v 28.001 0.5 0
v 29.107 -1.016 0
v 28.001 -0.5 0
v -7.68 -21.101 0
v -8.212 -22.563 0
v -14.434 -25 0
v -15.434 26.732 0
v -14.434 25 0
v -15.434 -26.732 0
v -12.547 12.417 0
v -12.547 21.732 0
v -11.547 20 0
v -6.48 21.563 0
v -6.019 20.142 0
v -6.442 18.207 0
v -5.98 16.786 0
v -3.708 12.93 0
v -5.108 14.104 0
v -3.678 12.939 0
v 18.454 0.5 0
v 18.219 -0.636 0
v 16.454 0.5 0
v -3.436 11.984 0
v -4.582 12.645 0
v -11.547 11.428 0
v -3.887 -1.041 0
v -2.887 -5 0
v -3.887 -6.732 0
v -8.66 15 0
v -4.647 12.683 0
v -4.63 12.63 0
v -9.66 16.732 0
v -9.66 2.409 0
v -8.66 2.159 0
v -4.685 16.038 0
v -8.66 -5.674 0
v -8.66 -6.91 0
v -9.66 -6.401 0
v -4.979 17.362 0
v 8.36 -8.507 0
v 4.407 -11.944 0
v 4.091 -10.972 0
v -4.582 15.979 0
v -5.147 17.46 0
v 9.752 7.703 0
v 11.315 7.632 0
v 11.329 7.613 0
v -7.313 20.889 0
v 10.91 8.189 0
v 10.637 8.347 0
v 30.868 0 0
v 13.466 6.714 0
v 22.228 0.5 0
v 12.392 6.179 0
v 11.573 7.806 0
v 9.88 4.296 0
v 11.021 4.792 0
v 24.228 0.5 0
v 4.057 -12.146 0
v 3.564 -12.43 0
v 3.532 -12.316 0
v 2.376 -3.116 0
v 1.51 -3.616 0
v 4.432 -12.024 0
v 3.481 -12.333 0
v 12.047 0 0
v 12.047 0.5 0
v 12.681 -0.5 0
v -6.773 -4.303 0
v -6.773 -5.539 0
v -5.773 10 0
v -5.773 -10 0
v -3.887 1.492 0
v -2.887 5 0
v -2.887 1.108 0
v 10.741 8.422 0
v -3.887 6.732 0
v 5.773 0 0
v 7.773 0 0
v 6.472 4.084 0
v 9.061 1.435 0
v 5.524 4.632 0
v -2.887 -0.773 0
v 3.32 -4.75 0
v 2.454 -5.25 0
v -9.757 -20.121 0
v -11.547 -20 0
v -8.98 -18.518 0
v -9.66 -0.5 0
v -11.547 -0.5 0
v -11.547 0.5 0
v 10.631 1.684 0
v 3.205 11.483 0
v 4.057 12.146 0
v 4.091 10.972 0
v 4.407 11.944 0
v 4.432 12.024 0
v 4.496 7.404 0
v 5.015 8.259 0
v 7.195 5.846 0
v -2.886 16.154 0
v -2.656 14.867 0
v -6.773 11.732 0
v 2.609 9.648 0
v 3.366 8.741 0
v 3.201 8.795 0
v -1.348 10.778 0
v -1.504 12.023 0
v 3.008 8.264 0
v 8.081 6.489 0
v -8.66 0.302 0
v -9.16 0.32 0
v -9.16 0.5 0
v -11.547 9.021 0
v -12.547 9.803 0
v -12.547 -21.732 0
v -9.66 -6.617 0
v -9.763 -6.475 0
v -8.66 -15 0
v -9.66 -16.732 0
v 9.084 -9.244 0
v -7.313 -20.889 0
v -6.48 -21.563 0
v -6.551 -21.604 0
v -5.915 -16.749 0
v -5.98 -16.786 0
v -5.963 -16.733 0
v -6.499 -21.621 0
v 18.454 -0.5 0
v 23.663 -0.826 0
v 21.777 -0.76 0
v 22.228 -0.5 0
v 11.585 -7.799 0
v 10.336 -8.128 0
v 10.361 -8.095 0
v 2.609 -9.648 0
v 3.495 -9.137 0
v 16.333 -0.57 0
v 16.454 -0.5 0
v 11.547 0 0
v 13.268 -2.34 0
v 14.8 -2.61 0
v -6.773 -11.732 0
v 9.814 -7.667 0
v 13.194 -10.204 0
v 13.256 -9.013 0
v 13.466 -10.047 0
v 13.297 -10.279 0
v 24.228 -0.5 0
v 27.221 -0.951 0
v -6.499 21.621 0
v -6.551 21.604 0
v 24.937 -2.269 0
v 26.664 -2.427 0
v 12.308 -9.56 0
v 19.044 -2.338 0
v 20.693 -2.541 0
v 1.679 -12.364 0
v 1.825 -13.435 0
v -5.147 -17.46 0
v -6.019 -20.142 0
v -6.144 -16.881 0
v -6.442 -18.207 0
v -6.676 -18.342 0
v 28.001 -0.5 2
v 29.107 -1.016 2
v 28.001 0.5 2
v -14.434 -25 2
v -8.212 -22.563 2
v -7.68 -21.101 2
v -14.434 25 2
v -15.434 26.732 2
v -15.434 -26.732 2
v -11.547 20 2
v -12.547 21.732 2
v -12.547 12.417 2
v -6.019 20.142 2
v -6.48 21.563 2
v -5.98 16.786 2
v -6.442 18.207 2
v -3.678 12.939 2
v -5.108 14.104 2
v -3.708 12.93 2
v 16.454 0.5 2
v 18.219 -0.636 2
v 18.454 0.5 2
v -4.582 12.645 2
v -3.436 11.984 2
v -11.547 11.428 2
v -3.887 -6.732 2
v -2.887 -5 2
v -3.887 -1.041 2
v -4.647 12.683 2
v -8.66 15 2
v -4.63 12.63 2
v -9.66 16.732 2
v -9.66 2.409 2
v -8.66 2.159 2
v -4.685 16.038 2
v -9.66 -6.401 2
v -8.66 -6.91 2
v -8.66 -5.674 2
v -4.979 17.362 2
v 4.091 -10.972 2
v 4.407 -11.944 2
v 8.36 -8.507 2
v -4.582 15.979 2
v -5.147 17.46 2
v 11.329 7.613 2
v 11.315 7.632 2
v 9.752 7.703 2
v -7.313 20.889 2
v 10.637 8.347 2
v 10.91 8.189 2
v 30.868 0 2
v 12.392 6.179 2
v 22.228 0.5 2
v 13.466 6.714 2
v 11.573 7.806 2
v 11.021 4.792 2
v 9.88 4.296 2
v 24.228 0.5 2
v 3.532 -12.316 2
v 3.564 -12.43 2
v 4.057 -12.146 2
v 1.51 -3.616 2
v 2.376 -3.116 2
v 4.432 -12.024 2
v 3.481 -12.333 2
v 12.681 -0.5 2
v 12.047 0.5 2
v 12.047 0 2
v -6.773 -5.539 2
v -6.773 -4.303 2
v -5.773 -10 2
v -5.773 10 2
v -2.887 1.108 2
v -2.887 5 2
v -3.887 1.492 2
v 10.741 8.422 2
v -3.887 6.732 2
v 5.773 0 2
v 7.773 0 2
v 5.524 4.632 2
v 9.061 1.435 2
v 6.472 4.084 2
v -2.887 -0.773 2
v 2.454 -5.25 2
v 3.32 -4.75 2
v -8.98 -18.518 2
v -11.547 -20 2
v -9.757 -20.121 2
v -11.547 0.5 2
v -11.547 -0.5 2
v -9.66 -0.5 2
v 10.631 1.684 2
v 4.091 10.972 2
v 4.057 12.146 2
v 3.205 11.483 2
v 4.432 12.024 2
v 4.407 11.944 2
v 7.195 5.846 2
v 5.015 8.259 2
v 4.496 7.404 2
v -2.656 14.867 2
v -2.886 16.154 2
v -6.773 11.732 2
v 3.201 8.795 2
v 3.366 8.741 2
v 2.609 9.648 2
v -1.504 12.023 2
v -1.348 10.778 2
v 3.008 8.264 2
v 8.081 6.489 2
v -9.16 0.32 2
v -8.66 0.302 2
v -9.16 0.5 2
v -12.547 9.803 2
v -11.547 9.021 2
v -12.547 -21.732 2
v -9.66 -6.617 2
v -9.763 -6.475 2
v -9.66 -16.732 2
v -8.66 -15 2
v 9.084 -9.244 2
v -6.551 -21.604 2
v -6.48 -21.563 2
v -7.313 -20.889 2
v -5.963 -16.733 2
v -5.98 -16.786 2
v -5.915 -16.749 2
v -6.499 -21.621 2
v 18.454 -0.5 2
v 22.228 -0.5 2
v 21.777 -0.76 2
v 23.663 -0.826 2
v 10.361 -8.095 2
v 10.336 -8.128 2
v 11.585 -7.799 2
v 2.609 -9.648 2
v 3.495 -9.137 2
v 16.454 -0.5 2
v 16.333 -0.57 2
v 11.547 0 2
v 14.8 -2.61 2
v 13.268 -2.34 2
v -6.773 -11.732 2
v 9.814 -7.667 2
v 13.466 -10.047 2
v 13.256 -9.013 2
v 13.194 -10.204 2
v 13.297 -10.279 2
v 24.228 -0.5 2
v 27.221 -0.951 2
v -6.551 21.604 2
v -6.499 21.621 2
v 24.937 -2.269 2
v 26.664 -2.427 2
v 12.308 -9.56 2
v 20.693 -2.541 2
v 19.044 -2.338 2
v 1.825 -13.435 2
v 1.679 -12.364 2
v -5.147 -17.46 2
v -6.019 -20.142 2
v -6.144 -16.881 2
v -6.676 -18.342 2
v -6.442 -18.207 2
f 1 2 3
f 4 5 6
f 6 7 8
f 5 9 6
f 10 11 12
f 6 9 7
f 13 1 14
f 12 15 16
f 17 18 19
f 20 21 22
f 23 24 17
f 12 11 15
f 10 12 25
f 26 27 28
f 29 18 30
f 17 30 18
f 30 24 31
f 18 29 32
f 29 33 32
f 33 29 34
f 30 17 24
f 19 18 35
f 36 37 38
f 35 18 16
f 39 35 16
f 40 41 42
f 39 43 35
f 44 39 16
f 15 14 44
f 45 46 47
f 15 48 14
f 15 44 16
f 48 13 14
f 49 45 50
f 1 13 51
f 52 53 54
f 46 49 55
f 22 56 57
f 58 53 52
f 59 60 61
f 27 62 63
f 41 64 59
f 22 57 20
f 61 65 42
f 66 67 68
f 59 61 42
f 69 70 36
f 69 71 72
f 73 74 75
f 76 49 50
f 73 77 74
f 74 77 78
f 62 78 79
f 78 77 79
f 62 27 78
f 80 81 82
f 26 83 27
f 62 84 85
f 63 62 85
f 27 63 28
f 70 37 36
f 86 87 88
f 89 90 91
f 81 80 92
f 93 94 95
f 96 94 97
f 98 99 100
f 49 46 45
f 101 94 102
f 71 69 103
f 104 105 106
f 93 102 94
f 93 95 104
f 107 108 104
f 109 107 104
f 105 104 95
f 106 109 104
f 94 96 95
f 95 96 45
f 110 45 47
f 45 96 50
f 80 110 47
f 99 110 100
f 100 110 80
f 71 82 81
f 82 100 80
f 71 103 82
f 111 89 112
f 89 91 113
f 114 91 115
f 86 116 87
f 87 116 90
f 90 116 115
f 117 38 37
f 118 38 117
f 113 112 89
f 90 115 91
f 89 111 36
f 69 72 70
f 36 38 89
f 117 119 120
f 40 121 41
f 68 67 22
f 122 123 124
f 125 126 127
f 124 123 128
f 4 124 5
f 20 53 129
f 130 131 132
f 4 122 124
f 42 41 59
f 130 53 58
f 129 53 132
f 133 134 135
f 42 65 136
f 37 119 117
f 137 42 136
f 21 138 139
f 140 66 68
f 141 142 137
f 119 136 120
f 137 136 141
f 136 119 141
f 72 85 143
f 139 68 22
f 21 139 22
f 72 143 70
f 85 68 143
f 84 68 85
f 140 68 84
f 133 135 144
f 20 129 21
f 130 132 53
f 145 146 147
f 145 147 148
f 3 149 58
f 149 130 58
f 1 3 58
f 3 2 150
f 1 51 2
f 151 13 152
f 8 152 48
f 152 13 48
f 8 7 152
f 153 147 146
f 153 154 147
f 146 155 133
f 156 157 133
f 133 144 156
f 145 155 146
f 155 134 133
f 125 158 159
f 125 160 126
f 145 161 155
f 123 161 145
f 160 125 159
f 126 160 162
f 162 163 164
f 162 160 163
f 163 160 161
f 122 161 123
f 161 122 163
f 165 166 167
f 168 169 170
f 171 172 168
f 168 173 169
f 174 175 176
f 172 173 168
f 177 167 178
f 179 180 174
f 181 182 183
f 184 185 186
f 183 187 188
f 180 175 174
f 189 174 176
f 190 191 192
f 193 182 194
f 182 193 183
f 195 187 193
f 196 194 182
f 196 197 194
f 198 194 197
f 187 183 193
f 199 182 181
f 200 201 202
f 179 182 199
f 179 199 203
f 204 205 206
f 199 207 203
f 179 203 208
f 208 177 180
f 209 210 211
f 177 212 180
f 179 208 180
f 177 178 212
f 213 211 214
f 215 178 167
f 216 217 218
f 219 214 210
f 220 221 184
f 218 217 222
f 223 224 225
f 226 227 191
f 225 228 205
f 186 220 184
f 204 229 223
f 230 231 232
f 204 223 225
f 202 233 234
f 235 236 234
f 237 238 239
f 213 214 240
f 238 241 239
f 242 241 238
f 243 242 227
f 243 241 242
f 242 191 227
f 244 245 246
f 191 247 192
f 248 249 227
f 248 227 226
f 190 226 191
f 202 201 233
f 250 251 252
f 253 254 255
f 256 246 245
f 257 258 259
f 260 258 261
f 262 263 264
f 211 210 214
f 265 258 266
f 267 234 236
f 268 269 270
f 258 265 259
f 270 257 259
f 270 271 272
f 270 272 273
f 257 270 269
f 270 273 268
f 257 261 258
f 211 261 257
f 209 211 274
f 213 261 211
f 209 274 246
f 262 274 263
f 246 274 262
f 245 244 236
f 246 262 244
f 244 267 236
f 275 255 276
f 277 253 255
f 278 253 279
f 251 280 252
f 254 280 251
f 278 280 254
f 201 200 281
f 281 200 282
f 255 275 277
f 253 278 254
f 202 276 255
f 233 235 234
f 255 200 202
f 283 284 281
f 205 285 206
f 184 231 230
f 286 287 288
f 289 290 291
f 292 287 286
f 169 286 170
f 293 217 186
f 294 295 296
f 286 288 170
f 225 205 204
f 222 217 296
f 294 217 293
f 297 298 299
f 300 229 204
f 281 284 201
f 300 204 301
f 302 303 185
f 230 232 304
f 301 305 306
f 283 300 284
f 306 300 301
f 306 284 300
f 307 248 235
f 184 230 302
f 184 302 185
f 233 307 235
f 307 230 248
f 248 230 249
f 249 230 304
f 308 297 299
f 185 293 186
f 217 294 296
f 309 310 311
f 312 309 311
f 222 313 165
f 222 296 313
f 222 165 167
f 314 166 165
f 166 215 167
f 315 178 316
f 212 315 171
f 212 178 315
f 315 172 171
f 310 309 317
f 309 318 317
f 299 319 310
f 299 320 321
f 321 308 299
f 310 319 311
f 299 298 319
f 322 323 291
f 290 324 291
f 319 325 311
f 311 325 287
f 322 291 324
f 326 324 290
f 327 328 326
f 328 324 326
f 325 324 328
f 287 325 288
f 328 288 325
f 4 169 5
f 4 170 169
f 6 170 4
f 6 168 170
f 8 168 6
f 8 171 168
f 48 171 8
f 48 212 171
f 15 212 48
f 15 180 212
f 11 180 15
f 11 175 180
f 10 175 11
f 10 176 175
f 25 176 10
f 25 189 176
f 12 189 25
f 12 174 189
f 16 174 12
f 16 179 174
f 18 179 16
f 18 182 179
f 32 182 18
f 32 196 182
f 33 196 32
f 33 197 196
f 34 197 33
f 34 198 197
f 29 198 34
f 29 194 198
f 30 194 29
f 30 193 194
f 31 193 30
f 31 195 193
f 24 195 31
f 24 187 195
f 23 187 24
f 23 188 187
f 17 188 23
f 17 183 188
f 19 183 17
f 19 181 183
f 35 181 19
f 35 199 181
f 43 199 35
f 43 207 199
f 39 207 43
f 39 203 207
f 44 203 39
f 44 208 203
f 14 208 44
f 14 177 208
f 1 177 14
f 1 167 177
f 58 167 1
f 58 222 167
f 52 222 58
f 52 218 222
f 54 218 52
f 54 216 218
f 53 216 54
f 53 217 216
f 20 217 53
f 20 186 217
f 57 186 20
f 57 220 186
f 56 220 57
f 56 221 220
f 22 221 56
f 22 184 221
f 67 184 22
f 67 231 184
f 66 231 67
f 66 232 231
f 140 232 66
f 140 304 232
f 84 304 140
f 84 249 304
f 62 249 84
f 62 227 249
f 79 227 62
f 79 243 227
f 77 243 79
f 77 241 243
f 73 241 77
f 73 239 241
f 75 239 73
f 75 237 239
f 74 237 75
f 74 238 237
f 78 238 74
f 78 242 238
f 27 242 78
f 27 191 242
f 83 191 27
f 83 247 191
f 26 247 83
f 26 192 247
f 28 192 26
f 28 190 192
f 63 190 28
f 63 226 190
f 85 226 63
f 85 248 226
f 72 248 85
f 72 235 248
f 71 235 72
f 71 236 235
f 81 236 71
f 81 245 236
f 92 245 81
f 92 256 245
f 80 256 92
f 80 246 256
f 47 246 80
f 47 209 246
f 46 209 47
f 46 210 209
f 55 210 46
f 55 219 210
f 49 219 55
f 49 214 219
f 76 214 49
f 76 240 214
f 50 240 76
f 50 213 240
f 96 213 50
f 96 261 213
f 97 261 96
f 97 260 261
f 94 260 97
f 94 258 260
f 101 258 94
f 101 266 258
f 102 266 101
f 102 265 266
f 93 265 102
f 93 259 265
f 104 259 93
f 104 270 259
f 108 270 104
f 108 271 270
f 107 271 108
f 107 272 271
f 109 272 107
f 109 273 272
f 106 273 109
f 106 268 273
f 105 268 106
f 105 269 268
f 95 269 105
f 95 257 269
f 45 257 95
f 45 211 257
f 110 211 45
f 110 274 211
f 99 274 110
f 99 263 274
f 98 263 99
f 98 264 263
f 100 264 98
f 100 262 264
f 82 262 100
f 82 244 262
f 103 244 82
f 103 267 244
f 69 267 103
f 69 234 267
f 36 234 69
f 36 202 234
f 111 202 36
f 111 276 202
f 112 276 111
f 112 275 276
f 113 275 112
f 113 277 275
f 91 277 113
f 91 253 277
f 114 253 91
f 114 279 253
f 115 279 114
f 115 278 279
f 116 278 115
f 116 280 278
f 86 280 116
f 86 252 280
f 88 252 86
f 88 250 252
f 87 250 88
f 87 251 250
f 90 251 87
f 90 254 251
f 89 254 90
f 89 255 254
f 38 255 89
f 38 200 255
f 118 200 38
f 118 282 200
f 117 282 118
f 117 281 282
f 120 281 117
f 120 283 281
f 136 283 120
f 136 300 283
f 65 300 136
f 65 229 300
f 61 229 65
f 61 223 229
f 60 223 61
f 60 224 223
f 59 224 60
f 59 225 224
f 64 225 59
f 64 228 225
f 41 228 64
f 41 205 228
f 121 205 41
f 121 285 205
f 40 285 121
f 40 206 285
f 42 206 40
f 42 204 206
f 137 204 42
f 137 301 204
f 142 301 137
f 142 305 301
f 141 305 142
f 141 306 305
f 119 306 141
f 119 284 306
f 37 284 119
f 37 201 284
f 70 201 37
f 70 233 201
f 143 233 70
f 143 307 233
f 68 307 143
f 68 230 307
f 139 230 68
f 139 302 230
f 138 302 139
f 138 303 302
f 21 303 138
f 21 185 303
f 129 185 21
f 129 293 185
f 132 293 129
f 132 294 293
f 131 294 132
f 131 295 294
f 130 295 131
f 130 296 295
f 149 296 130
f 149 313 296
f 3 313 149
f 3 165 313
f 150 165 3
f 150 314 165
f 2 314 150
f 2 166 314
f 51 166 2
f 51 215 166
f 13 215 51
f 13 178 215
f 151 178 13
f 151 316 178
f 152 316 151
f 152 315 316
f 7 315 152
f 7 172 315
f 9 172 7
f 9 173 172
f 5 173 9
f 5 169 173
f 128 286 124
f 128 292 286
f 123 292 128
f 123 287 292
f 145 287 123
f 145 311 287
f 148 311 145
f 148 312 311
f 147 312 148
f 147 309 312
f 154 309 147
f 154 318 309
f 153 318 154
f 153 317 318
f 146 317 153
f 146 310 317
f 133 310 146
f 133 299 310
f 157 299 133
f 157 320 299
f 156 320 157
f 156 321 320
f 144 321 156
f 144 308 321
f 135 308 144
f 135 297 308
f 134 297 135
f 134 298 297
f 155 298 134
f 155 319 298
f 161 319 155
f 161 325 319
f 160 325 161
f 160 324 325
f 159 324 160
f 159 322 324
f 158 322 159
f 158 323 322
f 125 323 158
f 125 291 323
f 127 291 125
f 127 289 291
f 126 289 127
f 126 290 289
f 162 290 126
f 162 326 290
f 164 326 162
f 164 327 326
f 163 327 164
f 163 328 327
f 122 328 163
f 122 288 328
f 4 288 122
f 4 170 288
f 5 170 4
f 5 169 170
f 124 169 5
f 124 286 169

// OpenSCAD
// file: random_maze_generator.scad
use <2d.scad>;

rows = 10; 
columns = 10; 
wall_thickness = 2;
wall_height = 5;
block_width = 5;


/*
 * constants, for clearness
 *
 */
 
// random directions, for picking up a direction to visit the next block
function PERMUTATION_OF_FOUR() = [
    [1, 2, 3, 4],
    [1, 2, 4, 3],
    [1, 3, 2, 4],
    [1, 3, 4, 2],
    [1, 4, 2, 3],
    [1, 4, 3, 2],
    [2, 1, 3, 4],
    [2, 1, 4, 3],
    [2, 3, 1, 4],
    [2, 3, 4, 1],
    [2, 4, 1, 3],
    [2, 4, 3, 1],
    [3, 1, 2, 4],
    [3, 1, 4, 2],
    [3, 2, 1, 4],
    [3, 2, 4, 1],
    [3, 4, 1, 2],
    [3, 4, 2, 1],
    [4, 1, 2, 3],
    [4, 1, 3, 2],
    [4, 2, 1, 3],
    [4, 2, 3, 1],
    [4, 3, 1, 2],
    [4, 3, 2, 1]
];

function NO_WALL() = 0;
function UP_WALL() = 1;
function RIGHT_WALL() = 2;
function UP_RIGHT_WALL() = 3;

function NOT_VISITED() = 0;
function VISITED() = 1;

/* 
 * modules for creating a maze
 *
 */

// create the outer wall of maze
module maze_outer_wall(rows, columns, block_width = 5, wall_thickness = 1) {
    x_line([0, rows * block_width], columns * block_width, wall_thickness);
    y_line([0, block_width], (rows - 1) * block_width, wall_thickness);
}

// create the inner wall of maze
module maze_inner_wall(maze, block_width = 5, wall_thickness = 1) {
    for(i = [0:len(maze) - 1]) {
        cord = maze[i];
        x = (cord[0] - 1) * block_width;
        y = (cord[1] - 1) * block_width;
        v = cord[3];
        
        if(v == 1 || v == 3) {
            x_line([x, y], block_width, wall_thickness);
        }
        if(v == 2 || v == 3) {
            y_line([x + block_width, y], block_width, wall_thickness);
        }
    }  
}

// create a maze
module maze(rows, columns, maze_vector, block_width = 5, wall_thickness = 1) {
     maze_outer_wall(rows, columns, block_width, wall_thickness);
     maze_inner_wall(maze_vector, block_width, wall_thickness);
}

/* 
 * utilities functions
 *
 */

// comare the equality of [x1, y1] and [x2, y2]
function cord_equals(cord1, cord2) = cord1 == cord2;

// is the point visited?
function not_visited(cord, vs, index = 0) =
    index == len(vs) ? true : 
        (cord_equals([vs[index][0], vs[index][1]], cord) && vs[index][2] == 1 ? false :
            not_visited(cord, vs, index + 1));
            
// pick a direction randomly
function rand_dirs() =
    PERMUTATION_OF_FOUR()[round(rands(0, 24, 1)[0])]; 

// give a index (exclusivly), slice a vector 
function head_to(i, vs) =
    i >= len(vs) ? vs : (
        i == 0 ? [] : concat(head_to(i - 1, vs), [vs[i - 1]])
    );

// give a index (exclusivly), slice a vector 
function tail_from(i, vs, index = 0, new_vs = []) =
    i >= len(vs) ? [] : (
        index < i ? tail_from(i, vs, index + 1) : (
            index < len(vs) ? tail_from(i, vs, index + 1, concat(new_vs, [vs[index]])) : new_vs
        )
    );

// replace v1 in the vector with v2 
function replace(v1, v2, vs, index = 0) =
    index == len(vs) ? vs : (
        vs[index] == v1 ? concat(concat(head_to(index, vs), [v2]), tail_from(index + 1, vs)) : replace(v1, v2, vs, index + 1)
    );
    
/* 
 * functions for generating a maze vector
 *
 */

// initialize rows of a maze
function init_row(n, length) =
    length == 0 ? [] : concat(init_row(n, length - 1), [[length, n, 0, UP_RIGHT_WALL()]]);
    
// initialize a maze
function init_maze(rows, columns) =
    rows == 0 ? [] : concat(init_maze(rows - 1, columns), init_row(rows, columns));
    
// find a vector in the maze vector
function find(i, j, maze_vector, index = 0) =
    index == len(maze_vector) ? [] : (
        cord_equals([i, j], [maze_vector[index][0], maze_vector[index][1]]) ? maze_vector[index] : find(i, j, maze_vector, index + 1)
    );

////
// NO_WALL = 0;
// UP_WALL = 1;
// RIGHT_WALL = 2;
// UP_RIGHT_WALL = 3;
function delete_right_wall(original_block) = 
    original_block == NO_WALL() || original_block == RIGHT_WALL() ? NO_WALL() : UP_WALL();

function delete_up_wall(original_block) = 
    (original_block == NO_WALL() || original_block == UP_WALL()) ? NO_WALL() : RIGHT_WALL();
    
function delete_right_wall_of(vs, is_visited, maze_vector) =
    replace(vs, [vs[0], vs[1] , is_visited, delete_right_wall(vs[3])] ,maze_vector);

function delete_up_wall_of(vs, is_visited, maze_vector) =
    replace(vs, [vs[0], vs[1] , is_visited, delete_up_wall(vs[3])] ,maze_vector);

function go_right(i, j, rows, columns, maze_vector) =
    go_maze(i + 1, j, rows, columns, delete_right_wall_of(find(i, j, maze_vector), VISITED(), maze_vector));
    
function go_up(i, j, rows, columns, maze_vector) =
    go_maze(i, j - 1, rows, columns, delete_up_wall_of(find(i, j, maze_vector), VISITED(), maze_vector));
    
function visit(v, maze_vector) =
    replace(v, [v[0], v[1], VISITED(), v[3]], maze_vector);
 
function go_left(i, j, rows, columns, maze_vector) =
    go_maze(i - 1, j, rows, columns, delete_right_wall_of(find(i - 1, j, maze_vector), NOT_VISITED(), maze_vector));
    
function go_down(i, j, rows, columns, maze_vector) =
    go_maze(i, j + 1, rows, columns, delete_up_wall_of(find(i, j + 1, maze_vector), NOT_VISITED(), maze_vector));
    
function go_maze(i, j, rows, columns, maze_vector) =
    look_around(i, j, rand_dirs(), rows, columns, visit(find(i, j, maze_vector), maze_vector));
    
function look_around(i, j, dirs, rows, columns, maze_vector, index = 0) =
    index == 4 ? maze_vector : 
        look_around( 
            i, j, dirs, 
            rows, columns, 
            build_wall(i, j, dirs[index], rows, columns, maze_vector), 
            index + 1
        ); 

function build_wall(i, j, n, rows, columns, maze_vector) = 
    n == 1 && i != columns && not_visited([i + 1, j], maze_vector) ? go_right(i, j, rows, columns, maze_vector) : ( 
        n == 2 && j != 1 && not_visited([i, j - 1], maze_vector) ? go_up(i, j, rows, columns, maze_vector)  : (
            n == 3 && i != 1 && not_visited([i - 1, j], maze_vector) ? go_left(i, j,rows, columns,  maze_vector)  : (
                n == 4 && j != rows && not_visited([i, j + 1], maze_vector) ? go_down(i, j, rows, columns, maze_vector) : maze_vector
            ) 
        )
    ); 
 
/*
 * create a maze
 *
 */
maze_vector = go_maze(1, 1, rows, columns, replace([columns, rows, 0, UP_RIGHT_WALL()], [columns, rows, 0, UP_WALL()], init_maze(rows, columns)));
linear_extrude(wall_height) 
    maze(rows, columns, maze_vector, block_width, wall_thickness);
// file: 2d.scad
function PI() = 3.14159;

// give a [x, y] point and length. draw a line in the x direction
module x_line(point, length, thickness = 1) {
    offset = thickness / 2;
    translate([point[0] - offset, point[1] - offset, 0]) 
        square([length + thickness, thickness]);
}

// give a [x, y] point and length. draw a line in the y direction
module y_line(point, length, thickness = 1) {
    offset = thickness / 2;
    translate([point[0] - offset, point[1] - offset, 0])  
        square([thickness, length + thickness]);
}

module a_quarter_arc(radius, angle, width = 1) {
    outer = radius + width;
    intersection() {
        difference() {
            offset(r = width) circle(radius, $fn=96); 
            circle(radius, $fn=96);
        }
        polygon([[0, 0], [outer, 0], [outer, outer * sin(angle)], [outer * cos(angle), outer * sin(angle)]]);
    }
}

module arc(radius, angles, width = 1) {
    angle_from = angles[0];
    angle_to = angles[1];
    angle_difference = angle_to - angle_from;
    outer = radius + width;
    rotate(angle_from)
        if(angle_difference <= 90) {
            a_quarter_arc(radius, angle_difference, width);
        } else if(angle_difference > 90 && angle_difference <= 180) {
            arc(radius, [0, 90], width);
            rotate(90) a_quarter_arc(radius, angle_difference - 90, width);
        } else if(angle_difference > 180 && angle_difference <= 270) {
            arc(radius, [0, 180], width);
            rotate(180) a_quarter_arc(radius, angle_difference - 180, width);
        } else if(angle_difference > 270 && angle_difference <= 360) {
            arc(radius, [0, 270], width);
            rotate(270) a_quarter_arc(radius, angle_difference - 270, width);
       }
}




// create a equilateral triangle
module equilateral_triangle(side_length, center = false) {
    radius = 0.57735026918962576450914878050196 * side_length;
	circle(r = radius, center = center, $fn = 3); 
}

// create a holly equilateral triangle
module holly_equilateral_triangle(side_length, thickness = 1, center = true) {
    difference() {
	    offset(delta = thickness) equilateral_triangle(side_length, center = center);
	    equilateral_triangle(side_length, center = center);
    }
}
// main file
use <2d.scad>;
use <random_maze_generator.scad>;

side_length = 50; 

wall_thickness = 1;
wall_height = 2;

cblocks = 10;  
levels = 5; 

// Given a side length of a equilateral triangle, return the length of incenter to vertex.
function triangle_incenter_to_vertex_length(triangle_side_length) = 0.57735026918962576450914878050196 * triangle_side_length;

// used by `sector_cutter` module. Accepted angle is from 0 to 90 degree.
module a_quarter_sector_cutter(radius, angle) {
    outer = radius;
    polygon([[0, 0], [outer, 0], [outer, outer * sin(angle)], [outer * cos(angle), outer * sin(angle)]]);
}

// userd by `holly_equilateral_triangle_sector` for difference
module sector_cutter(radius, angles) {
    angle_from = angles[0];
    angle_to = angles[1];
    angle_difference = angle_to - angle_from;
    
    rotate(angle_from)
        if(angle_difference <= 90) {
            a_quarter_sector_cutter(radius, angle_difference);
        } else if(angle_difference > 90 && angle_difference <= 180) {
            sector_cutter(radius, [0, 90]);
            rotate(90) a_quarter_sector_cutter(radius, angle_difference - 90);
        } else if(angle_difference > 180 && angle_difference <= 270) {
            sector_cutter(radius, [0, 180]);
            rotate(180) a_quarter_sector_cutter(radius, angle_difference - 180);
        } else if(angle_difference > 270 && angle_difference <= 360) {
            sector_cutter(radius, [0, 270]);
            rotate(270) a_quarter_sector_cutter(radius, angle_difference - 270);
       }
}

// For a triangle, a different angle has a different length from incenter to its side.
function triangle_incenter_to_side_length(incenter_to_vertex_length, angle) = 
    (angle >= 0 && angle <= 60) ? 0.5 * incenter_to_vertex_length / cos(angle) : (
	    (angle > 60 && angle <= 120) ? triangle_incenter_to_side_length(incenter_to_vertex_length, 120 - angle) : triangle_incenter_to_side_length(incenter_to_vertex_length, angle - 120)
	);

// draw a line from incenter to side for a equilateral triangle
module triangle_incenter_to_side_line(side_length, angle, incenter_to_side_blocks, level, thickness = 1) {
    block_length = triangle_incenter_to_side_length(triangle_incenter_to_vertex_length(side_length), angle + 60) / incenter_to_side_blocks ;
	
	rotate([0, 0, angle]) 
	    translate([block_length * (level - 1) + thickness, 0, 0])
		    x_line([0, 0], block_length - thickness / 2, thickness);
}

// draw a side between `angles[0]` and `angles[1]`
module holly_equilateral_triangle_sector(side_length, angles, thickness = 1) {
	intersection() {
        holly_equilateral_triangle(side_length, thickness);
	    sector_cutter(triangle_incenter_to_vertex_length(side_length) + thickness * 2, [angles[0], angles[1]]);
	}
}

module triangle_maze(side_length, cblocks, levels, thickness = 1) {
    full_circle_angle = 360;
    arc_angle = full_circle_angle / cblocks;
	incenter_to_side_blocks = levels - 2;
	
	divided_side_length = side_length / levels;
	
	maze = go_maze(1, 1, cblocks, incenter_to_side_blocks, replace([incenter_to_side_blocks, cblocks, 0, UP_RIGHT_WALL()], [incenter_to_side_blocks, cblocks, 0, UP_WALL()], init_maze(cblocks, incenter_to_side_blocks)));
	  
	// maze
    for(i = [0:len(maze) - 1]) { 
        cord = maze[i];
		cr = cord[0]; 
		cc = cord[1] - 1;    
        v = cord[3];
        
		angle = cc * arc_angle;
		
        if(v == 1 || v == 3) {
			triangle_incenter_to_side_line(side_length, angle, levels, cr + 2, thickness);
        } 
		
        if(v == 2 || v == 3) {
		    sl = divided_side_length * (cr + 2);
			offset_angle = angle - arc_angle / 18;
			
			holly_equilateral_triangle_sector(sl, [offset_angle,  offset_angle + arc_angle], thickness);   
        } 
		
		if(v == 0 || v == 1) {
		    sl = divided_side_length * (cr + 2);		
			factor = abs((arc_angle * (cc + 1)) % 120 - 60) / 60; 
			offset_angle = angle - arc_angle / 18;
			
			holly_equilateral_triangle_sector(sl, [offset_angle, offset_angle + arc_angle * (sl - divided_side_length + factor) / (sl - factor * (cr + 2))], thickness);    
		}		
	}
	
	// inner triangle
	rotate([0, 0, 240]) 
		holly_equilateral_triangle_sector(divided_side_length, [-45, 315 - arc_angle], thickness);
	
	triangle_incenter_to_side_line(side_length, 300, levels, 2, thickness = 1);

	holly_equilateral_triangle_sector(divided_side_length * 2, [arc_angle / 4, 360], thickness);
}

linear_extrude(wall_height) 
    triangle_maze(side_length, cblocks, levels, wall_thickness);
